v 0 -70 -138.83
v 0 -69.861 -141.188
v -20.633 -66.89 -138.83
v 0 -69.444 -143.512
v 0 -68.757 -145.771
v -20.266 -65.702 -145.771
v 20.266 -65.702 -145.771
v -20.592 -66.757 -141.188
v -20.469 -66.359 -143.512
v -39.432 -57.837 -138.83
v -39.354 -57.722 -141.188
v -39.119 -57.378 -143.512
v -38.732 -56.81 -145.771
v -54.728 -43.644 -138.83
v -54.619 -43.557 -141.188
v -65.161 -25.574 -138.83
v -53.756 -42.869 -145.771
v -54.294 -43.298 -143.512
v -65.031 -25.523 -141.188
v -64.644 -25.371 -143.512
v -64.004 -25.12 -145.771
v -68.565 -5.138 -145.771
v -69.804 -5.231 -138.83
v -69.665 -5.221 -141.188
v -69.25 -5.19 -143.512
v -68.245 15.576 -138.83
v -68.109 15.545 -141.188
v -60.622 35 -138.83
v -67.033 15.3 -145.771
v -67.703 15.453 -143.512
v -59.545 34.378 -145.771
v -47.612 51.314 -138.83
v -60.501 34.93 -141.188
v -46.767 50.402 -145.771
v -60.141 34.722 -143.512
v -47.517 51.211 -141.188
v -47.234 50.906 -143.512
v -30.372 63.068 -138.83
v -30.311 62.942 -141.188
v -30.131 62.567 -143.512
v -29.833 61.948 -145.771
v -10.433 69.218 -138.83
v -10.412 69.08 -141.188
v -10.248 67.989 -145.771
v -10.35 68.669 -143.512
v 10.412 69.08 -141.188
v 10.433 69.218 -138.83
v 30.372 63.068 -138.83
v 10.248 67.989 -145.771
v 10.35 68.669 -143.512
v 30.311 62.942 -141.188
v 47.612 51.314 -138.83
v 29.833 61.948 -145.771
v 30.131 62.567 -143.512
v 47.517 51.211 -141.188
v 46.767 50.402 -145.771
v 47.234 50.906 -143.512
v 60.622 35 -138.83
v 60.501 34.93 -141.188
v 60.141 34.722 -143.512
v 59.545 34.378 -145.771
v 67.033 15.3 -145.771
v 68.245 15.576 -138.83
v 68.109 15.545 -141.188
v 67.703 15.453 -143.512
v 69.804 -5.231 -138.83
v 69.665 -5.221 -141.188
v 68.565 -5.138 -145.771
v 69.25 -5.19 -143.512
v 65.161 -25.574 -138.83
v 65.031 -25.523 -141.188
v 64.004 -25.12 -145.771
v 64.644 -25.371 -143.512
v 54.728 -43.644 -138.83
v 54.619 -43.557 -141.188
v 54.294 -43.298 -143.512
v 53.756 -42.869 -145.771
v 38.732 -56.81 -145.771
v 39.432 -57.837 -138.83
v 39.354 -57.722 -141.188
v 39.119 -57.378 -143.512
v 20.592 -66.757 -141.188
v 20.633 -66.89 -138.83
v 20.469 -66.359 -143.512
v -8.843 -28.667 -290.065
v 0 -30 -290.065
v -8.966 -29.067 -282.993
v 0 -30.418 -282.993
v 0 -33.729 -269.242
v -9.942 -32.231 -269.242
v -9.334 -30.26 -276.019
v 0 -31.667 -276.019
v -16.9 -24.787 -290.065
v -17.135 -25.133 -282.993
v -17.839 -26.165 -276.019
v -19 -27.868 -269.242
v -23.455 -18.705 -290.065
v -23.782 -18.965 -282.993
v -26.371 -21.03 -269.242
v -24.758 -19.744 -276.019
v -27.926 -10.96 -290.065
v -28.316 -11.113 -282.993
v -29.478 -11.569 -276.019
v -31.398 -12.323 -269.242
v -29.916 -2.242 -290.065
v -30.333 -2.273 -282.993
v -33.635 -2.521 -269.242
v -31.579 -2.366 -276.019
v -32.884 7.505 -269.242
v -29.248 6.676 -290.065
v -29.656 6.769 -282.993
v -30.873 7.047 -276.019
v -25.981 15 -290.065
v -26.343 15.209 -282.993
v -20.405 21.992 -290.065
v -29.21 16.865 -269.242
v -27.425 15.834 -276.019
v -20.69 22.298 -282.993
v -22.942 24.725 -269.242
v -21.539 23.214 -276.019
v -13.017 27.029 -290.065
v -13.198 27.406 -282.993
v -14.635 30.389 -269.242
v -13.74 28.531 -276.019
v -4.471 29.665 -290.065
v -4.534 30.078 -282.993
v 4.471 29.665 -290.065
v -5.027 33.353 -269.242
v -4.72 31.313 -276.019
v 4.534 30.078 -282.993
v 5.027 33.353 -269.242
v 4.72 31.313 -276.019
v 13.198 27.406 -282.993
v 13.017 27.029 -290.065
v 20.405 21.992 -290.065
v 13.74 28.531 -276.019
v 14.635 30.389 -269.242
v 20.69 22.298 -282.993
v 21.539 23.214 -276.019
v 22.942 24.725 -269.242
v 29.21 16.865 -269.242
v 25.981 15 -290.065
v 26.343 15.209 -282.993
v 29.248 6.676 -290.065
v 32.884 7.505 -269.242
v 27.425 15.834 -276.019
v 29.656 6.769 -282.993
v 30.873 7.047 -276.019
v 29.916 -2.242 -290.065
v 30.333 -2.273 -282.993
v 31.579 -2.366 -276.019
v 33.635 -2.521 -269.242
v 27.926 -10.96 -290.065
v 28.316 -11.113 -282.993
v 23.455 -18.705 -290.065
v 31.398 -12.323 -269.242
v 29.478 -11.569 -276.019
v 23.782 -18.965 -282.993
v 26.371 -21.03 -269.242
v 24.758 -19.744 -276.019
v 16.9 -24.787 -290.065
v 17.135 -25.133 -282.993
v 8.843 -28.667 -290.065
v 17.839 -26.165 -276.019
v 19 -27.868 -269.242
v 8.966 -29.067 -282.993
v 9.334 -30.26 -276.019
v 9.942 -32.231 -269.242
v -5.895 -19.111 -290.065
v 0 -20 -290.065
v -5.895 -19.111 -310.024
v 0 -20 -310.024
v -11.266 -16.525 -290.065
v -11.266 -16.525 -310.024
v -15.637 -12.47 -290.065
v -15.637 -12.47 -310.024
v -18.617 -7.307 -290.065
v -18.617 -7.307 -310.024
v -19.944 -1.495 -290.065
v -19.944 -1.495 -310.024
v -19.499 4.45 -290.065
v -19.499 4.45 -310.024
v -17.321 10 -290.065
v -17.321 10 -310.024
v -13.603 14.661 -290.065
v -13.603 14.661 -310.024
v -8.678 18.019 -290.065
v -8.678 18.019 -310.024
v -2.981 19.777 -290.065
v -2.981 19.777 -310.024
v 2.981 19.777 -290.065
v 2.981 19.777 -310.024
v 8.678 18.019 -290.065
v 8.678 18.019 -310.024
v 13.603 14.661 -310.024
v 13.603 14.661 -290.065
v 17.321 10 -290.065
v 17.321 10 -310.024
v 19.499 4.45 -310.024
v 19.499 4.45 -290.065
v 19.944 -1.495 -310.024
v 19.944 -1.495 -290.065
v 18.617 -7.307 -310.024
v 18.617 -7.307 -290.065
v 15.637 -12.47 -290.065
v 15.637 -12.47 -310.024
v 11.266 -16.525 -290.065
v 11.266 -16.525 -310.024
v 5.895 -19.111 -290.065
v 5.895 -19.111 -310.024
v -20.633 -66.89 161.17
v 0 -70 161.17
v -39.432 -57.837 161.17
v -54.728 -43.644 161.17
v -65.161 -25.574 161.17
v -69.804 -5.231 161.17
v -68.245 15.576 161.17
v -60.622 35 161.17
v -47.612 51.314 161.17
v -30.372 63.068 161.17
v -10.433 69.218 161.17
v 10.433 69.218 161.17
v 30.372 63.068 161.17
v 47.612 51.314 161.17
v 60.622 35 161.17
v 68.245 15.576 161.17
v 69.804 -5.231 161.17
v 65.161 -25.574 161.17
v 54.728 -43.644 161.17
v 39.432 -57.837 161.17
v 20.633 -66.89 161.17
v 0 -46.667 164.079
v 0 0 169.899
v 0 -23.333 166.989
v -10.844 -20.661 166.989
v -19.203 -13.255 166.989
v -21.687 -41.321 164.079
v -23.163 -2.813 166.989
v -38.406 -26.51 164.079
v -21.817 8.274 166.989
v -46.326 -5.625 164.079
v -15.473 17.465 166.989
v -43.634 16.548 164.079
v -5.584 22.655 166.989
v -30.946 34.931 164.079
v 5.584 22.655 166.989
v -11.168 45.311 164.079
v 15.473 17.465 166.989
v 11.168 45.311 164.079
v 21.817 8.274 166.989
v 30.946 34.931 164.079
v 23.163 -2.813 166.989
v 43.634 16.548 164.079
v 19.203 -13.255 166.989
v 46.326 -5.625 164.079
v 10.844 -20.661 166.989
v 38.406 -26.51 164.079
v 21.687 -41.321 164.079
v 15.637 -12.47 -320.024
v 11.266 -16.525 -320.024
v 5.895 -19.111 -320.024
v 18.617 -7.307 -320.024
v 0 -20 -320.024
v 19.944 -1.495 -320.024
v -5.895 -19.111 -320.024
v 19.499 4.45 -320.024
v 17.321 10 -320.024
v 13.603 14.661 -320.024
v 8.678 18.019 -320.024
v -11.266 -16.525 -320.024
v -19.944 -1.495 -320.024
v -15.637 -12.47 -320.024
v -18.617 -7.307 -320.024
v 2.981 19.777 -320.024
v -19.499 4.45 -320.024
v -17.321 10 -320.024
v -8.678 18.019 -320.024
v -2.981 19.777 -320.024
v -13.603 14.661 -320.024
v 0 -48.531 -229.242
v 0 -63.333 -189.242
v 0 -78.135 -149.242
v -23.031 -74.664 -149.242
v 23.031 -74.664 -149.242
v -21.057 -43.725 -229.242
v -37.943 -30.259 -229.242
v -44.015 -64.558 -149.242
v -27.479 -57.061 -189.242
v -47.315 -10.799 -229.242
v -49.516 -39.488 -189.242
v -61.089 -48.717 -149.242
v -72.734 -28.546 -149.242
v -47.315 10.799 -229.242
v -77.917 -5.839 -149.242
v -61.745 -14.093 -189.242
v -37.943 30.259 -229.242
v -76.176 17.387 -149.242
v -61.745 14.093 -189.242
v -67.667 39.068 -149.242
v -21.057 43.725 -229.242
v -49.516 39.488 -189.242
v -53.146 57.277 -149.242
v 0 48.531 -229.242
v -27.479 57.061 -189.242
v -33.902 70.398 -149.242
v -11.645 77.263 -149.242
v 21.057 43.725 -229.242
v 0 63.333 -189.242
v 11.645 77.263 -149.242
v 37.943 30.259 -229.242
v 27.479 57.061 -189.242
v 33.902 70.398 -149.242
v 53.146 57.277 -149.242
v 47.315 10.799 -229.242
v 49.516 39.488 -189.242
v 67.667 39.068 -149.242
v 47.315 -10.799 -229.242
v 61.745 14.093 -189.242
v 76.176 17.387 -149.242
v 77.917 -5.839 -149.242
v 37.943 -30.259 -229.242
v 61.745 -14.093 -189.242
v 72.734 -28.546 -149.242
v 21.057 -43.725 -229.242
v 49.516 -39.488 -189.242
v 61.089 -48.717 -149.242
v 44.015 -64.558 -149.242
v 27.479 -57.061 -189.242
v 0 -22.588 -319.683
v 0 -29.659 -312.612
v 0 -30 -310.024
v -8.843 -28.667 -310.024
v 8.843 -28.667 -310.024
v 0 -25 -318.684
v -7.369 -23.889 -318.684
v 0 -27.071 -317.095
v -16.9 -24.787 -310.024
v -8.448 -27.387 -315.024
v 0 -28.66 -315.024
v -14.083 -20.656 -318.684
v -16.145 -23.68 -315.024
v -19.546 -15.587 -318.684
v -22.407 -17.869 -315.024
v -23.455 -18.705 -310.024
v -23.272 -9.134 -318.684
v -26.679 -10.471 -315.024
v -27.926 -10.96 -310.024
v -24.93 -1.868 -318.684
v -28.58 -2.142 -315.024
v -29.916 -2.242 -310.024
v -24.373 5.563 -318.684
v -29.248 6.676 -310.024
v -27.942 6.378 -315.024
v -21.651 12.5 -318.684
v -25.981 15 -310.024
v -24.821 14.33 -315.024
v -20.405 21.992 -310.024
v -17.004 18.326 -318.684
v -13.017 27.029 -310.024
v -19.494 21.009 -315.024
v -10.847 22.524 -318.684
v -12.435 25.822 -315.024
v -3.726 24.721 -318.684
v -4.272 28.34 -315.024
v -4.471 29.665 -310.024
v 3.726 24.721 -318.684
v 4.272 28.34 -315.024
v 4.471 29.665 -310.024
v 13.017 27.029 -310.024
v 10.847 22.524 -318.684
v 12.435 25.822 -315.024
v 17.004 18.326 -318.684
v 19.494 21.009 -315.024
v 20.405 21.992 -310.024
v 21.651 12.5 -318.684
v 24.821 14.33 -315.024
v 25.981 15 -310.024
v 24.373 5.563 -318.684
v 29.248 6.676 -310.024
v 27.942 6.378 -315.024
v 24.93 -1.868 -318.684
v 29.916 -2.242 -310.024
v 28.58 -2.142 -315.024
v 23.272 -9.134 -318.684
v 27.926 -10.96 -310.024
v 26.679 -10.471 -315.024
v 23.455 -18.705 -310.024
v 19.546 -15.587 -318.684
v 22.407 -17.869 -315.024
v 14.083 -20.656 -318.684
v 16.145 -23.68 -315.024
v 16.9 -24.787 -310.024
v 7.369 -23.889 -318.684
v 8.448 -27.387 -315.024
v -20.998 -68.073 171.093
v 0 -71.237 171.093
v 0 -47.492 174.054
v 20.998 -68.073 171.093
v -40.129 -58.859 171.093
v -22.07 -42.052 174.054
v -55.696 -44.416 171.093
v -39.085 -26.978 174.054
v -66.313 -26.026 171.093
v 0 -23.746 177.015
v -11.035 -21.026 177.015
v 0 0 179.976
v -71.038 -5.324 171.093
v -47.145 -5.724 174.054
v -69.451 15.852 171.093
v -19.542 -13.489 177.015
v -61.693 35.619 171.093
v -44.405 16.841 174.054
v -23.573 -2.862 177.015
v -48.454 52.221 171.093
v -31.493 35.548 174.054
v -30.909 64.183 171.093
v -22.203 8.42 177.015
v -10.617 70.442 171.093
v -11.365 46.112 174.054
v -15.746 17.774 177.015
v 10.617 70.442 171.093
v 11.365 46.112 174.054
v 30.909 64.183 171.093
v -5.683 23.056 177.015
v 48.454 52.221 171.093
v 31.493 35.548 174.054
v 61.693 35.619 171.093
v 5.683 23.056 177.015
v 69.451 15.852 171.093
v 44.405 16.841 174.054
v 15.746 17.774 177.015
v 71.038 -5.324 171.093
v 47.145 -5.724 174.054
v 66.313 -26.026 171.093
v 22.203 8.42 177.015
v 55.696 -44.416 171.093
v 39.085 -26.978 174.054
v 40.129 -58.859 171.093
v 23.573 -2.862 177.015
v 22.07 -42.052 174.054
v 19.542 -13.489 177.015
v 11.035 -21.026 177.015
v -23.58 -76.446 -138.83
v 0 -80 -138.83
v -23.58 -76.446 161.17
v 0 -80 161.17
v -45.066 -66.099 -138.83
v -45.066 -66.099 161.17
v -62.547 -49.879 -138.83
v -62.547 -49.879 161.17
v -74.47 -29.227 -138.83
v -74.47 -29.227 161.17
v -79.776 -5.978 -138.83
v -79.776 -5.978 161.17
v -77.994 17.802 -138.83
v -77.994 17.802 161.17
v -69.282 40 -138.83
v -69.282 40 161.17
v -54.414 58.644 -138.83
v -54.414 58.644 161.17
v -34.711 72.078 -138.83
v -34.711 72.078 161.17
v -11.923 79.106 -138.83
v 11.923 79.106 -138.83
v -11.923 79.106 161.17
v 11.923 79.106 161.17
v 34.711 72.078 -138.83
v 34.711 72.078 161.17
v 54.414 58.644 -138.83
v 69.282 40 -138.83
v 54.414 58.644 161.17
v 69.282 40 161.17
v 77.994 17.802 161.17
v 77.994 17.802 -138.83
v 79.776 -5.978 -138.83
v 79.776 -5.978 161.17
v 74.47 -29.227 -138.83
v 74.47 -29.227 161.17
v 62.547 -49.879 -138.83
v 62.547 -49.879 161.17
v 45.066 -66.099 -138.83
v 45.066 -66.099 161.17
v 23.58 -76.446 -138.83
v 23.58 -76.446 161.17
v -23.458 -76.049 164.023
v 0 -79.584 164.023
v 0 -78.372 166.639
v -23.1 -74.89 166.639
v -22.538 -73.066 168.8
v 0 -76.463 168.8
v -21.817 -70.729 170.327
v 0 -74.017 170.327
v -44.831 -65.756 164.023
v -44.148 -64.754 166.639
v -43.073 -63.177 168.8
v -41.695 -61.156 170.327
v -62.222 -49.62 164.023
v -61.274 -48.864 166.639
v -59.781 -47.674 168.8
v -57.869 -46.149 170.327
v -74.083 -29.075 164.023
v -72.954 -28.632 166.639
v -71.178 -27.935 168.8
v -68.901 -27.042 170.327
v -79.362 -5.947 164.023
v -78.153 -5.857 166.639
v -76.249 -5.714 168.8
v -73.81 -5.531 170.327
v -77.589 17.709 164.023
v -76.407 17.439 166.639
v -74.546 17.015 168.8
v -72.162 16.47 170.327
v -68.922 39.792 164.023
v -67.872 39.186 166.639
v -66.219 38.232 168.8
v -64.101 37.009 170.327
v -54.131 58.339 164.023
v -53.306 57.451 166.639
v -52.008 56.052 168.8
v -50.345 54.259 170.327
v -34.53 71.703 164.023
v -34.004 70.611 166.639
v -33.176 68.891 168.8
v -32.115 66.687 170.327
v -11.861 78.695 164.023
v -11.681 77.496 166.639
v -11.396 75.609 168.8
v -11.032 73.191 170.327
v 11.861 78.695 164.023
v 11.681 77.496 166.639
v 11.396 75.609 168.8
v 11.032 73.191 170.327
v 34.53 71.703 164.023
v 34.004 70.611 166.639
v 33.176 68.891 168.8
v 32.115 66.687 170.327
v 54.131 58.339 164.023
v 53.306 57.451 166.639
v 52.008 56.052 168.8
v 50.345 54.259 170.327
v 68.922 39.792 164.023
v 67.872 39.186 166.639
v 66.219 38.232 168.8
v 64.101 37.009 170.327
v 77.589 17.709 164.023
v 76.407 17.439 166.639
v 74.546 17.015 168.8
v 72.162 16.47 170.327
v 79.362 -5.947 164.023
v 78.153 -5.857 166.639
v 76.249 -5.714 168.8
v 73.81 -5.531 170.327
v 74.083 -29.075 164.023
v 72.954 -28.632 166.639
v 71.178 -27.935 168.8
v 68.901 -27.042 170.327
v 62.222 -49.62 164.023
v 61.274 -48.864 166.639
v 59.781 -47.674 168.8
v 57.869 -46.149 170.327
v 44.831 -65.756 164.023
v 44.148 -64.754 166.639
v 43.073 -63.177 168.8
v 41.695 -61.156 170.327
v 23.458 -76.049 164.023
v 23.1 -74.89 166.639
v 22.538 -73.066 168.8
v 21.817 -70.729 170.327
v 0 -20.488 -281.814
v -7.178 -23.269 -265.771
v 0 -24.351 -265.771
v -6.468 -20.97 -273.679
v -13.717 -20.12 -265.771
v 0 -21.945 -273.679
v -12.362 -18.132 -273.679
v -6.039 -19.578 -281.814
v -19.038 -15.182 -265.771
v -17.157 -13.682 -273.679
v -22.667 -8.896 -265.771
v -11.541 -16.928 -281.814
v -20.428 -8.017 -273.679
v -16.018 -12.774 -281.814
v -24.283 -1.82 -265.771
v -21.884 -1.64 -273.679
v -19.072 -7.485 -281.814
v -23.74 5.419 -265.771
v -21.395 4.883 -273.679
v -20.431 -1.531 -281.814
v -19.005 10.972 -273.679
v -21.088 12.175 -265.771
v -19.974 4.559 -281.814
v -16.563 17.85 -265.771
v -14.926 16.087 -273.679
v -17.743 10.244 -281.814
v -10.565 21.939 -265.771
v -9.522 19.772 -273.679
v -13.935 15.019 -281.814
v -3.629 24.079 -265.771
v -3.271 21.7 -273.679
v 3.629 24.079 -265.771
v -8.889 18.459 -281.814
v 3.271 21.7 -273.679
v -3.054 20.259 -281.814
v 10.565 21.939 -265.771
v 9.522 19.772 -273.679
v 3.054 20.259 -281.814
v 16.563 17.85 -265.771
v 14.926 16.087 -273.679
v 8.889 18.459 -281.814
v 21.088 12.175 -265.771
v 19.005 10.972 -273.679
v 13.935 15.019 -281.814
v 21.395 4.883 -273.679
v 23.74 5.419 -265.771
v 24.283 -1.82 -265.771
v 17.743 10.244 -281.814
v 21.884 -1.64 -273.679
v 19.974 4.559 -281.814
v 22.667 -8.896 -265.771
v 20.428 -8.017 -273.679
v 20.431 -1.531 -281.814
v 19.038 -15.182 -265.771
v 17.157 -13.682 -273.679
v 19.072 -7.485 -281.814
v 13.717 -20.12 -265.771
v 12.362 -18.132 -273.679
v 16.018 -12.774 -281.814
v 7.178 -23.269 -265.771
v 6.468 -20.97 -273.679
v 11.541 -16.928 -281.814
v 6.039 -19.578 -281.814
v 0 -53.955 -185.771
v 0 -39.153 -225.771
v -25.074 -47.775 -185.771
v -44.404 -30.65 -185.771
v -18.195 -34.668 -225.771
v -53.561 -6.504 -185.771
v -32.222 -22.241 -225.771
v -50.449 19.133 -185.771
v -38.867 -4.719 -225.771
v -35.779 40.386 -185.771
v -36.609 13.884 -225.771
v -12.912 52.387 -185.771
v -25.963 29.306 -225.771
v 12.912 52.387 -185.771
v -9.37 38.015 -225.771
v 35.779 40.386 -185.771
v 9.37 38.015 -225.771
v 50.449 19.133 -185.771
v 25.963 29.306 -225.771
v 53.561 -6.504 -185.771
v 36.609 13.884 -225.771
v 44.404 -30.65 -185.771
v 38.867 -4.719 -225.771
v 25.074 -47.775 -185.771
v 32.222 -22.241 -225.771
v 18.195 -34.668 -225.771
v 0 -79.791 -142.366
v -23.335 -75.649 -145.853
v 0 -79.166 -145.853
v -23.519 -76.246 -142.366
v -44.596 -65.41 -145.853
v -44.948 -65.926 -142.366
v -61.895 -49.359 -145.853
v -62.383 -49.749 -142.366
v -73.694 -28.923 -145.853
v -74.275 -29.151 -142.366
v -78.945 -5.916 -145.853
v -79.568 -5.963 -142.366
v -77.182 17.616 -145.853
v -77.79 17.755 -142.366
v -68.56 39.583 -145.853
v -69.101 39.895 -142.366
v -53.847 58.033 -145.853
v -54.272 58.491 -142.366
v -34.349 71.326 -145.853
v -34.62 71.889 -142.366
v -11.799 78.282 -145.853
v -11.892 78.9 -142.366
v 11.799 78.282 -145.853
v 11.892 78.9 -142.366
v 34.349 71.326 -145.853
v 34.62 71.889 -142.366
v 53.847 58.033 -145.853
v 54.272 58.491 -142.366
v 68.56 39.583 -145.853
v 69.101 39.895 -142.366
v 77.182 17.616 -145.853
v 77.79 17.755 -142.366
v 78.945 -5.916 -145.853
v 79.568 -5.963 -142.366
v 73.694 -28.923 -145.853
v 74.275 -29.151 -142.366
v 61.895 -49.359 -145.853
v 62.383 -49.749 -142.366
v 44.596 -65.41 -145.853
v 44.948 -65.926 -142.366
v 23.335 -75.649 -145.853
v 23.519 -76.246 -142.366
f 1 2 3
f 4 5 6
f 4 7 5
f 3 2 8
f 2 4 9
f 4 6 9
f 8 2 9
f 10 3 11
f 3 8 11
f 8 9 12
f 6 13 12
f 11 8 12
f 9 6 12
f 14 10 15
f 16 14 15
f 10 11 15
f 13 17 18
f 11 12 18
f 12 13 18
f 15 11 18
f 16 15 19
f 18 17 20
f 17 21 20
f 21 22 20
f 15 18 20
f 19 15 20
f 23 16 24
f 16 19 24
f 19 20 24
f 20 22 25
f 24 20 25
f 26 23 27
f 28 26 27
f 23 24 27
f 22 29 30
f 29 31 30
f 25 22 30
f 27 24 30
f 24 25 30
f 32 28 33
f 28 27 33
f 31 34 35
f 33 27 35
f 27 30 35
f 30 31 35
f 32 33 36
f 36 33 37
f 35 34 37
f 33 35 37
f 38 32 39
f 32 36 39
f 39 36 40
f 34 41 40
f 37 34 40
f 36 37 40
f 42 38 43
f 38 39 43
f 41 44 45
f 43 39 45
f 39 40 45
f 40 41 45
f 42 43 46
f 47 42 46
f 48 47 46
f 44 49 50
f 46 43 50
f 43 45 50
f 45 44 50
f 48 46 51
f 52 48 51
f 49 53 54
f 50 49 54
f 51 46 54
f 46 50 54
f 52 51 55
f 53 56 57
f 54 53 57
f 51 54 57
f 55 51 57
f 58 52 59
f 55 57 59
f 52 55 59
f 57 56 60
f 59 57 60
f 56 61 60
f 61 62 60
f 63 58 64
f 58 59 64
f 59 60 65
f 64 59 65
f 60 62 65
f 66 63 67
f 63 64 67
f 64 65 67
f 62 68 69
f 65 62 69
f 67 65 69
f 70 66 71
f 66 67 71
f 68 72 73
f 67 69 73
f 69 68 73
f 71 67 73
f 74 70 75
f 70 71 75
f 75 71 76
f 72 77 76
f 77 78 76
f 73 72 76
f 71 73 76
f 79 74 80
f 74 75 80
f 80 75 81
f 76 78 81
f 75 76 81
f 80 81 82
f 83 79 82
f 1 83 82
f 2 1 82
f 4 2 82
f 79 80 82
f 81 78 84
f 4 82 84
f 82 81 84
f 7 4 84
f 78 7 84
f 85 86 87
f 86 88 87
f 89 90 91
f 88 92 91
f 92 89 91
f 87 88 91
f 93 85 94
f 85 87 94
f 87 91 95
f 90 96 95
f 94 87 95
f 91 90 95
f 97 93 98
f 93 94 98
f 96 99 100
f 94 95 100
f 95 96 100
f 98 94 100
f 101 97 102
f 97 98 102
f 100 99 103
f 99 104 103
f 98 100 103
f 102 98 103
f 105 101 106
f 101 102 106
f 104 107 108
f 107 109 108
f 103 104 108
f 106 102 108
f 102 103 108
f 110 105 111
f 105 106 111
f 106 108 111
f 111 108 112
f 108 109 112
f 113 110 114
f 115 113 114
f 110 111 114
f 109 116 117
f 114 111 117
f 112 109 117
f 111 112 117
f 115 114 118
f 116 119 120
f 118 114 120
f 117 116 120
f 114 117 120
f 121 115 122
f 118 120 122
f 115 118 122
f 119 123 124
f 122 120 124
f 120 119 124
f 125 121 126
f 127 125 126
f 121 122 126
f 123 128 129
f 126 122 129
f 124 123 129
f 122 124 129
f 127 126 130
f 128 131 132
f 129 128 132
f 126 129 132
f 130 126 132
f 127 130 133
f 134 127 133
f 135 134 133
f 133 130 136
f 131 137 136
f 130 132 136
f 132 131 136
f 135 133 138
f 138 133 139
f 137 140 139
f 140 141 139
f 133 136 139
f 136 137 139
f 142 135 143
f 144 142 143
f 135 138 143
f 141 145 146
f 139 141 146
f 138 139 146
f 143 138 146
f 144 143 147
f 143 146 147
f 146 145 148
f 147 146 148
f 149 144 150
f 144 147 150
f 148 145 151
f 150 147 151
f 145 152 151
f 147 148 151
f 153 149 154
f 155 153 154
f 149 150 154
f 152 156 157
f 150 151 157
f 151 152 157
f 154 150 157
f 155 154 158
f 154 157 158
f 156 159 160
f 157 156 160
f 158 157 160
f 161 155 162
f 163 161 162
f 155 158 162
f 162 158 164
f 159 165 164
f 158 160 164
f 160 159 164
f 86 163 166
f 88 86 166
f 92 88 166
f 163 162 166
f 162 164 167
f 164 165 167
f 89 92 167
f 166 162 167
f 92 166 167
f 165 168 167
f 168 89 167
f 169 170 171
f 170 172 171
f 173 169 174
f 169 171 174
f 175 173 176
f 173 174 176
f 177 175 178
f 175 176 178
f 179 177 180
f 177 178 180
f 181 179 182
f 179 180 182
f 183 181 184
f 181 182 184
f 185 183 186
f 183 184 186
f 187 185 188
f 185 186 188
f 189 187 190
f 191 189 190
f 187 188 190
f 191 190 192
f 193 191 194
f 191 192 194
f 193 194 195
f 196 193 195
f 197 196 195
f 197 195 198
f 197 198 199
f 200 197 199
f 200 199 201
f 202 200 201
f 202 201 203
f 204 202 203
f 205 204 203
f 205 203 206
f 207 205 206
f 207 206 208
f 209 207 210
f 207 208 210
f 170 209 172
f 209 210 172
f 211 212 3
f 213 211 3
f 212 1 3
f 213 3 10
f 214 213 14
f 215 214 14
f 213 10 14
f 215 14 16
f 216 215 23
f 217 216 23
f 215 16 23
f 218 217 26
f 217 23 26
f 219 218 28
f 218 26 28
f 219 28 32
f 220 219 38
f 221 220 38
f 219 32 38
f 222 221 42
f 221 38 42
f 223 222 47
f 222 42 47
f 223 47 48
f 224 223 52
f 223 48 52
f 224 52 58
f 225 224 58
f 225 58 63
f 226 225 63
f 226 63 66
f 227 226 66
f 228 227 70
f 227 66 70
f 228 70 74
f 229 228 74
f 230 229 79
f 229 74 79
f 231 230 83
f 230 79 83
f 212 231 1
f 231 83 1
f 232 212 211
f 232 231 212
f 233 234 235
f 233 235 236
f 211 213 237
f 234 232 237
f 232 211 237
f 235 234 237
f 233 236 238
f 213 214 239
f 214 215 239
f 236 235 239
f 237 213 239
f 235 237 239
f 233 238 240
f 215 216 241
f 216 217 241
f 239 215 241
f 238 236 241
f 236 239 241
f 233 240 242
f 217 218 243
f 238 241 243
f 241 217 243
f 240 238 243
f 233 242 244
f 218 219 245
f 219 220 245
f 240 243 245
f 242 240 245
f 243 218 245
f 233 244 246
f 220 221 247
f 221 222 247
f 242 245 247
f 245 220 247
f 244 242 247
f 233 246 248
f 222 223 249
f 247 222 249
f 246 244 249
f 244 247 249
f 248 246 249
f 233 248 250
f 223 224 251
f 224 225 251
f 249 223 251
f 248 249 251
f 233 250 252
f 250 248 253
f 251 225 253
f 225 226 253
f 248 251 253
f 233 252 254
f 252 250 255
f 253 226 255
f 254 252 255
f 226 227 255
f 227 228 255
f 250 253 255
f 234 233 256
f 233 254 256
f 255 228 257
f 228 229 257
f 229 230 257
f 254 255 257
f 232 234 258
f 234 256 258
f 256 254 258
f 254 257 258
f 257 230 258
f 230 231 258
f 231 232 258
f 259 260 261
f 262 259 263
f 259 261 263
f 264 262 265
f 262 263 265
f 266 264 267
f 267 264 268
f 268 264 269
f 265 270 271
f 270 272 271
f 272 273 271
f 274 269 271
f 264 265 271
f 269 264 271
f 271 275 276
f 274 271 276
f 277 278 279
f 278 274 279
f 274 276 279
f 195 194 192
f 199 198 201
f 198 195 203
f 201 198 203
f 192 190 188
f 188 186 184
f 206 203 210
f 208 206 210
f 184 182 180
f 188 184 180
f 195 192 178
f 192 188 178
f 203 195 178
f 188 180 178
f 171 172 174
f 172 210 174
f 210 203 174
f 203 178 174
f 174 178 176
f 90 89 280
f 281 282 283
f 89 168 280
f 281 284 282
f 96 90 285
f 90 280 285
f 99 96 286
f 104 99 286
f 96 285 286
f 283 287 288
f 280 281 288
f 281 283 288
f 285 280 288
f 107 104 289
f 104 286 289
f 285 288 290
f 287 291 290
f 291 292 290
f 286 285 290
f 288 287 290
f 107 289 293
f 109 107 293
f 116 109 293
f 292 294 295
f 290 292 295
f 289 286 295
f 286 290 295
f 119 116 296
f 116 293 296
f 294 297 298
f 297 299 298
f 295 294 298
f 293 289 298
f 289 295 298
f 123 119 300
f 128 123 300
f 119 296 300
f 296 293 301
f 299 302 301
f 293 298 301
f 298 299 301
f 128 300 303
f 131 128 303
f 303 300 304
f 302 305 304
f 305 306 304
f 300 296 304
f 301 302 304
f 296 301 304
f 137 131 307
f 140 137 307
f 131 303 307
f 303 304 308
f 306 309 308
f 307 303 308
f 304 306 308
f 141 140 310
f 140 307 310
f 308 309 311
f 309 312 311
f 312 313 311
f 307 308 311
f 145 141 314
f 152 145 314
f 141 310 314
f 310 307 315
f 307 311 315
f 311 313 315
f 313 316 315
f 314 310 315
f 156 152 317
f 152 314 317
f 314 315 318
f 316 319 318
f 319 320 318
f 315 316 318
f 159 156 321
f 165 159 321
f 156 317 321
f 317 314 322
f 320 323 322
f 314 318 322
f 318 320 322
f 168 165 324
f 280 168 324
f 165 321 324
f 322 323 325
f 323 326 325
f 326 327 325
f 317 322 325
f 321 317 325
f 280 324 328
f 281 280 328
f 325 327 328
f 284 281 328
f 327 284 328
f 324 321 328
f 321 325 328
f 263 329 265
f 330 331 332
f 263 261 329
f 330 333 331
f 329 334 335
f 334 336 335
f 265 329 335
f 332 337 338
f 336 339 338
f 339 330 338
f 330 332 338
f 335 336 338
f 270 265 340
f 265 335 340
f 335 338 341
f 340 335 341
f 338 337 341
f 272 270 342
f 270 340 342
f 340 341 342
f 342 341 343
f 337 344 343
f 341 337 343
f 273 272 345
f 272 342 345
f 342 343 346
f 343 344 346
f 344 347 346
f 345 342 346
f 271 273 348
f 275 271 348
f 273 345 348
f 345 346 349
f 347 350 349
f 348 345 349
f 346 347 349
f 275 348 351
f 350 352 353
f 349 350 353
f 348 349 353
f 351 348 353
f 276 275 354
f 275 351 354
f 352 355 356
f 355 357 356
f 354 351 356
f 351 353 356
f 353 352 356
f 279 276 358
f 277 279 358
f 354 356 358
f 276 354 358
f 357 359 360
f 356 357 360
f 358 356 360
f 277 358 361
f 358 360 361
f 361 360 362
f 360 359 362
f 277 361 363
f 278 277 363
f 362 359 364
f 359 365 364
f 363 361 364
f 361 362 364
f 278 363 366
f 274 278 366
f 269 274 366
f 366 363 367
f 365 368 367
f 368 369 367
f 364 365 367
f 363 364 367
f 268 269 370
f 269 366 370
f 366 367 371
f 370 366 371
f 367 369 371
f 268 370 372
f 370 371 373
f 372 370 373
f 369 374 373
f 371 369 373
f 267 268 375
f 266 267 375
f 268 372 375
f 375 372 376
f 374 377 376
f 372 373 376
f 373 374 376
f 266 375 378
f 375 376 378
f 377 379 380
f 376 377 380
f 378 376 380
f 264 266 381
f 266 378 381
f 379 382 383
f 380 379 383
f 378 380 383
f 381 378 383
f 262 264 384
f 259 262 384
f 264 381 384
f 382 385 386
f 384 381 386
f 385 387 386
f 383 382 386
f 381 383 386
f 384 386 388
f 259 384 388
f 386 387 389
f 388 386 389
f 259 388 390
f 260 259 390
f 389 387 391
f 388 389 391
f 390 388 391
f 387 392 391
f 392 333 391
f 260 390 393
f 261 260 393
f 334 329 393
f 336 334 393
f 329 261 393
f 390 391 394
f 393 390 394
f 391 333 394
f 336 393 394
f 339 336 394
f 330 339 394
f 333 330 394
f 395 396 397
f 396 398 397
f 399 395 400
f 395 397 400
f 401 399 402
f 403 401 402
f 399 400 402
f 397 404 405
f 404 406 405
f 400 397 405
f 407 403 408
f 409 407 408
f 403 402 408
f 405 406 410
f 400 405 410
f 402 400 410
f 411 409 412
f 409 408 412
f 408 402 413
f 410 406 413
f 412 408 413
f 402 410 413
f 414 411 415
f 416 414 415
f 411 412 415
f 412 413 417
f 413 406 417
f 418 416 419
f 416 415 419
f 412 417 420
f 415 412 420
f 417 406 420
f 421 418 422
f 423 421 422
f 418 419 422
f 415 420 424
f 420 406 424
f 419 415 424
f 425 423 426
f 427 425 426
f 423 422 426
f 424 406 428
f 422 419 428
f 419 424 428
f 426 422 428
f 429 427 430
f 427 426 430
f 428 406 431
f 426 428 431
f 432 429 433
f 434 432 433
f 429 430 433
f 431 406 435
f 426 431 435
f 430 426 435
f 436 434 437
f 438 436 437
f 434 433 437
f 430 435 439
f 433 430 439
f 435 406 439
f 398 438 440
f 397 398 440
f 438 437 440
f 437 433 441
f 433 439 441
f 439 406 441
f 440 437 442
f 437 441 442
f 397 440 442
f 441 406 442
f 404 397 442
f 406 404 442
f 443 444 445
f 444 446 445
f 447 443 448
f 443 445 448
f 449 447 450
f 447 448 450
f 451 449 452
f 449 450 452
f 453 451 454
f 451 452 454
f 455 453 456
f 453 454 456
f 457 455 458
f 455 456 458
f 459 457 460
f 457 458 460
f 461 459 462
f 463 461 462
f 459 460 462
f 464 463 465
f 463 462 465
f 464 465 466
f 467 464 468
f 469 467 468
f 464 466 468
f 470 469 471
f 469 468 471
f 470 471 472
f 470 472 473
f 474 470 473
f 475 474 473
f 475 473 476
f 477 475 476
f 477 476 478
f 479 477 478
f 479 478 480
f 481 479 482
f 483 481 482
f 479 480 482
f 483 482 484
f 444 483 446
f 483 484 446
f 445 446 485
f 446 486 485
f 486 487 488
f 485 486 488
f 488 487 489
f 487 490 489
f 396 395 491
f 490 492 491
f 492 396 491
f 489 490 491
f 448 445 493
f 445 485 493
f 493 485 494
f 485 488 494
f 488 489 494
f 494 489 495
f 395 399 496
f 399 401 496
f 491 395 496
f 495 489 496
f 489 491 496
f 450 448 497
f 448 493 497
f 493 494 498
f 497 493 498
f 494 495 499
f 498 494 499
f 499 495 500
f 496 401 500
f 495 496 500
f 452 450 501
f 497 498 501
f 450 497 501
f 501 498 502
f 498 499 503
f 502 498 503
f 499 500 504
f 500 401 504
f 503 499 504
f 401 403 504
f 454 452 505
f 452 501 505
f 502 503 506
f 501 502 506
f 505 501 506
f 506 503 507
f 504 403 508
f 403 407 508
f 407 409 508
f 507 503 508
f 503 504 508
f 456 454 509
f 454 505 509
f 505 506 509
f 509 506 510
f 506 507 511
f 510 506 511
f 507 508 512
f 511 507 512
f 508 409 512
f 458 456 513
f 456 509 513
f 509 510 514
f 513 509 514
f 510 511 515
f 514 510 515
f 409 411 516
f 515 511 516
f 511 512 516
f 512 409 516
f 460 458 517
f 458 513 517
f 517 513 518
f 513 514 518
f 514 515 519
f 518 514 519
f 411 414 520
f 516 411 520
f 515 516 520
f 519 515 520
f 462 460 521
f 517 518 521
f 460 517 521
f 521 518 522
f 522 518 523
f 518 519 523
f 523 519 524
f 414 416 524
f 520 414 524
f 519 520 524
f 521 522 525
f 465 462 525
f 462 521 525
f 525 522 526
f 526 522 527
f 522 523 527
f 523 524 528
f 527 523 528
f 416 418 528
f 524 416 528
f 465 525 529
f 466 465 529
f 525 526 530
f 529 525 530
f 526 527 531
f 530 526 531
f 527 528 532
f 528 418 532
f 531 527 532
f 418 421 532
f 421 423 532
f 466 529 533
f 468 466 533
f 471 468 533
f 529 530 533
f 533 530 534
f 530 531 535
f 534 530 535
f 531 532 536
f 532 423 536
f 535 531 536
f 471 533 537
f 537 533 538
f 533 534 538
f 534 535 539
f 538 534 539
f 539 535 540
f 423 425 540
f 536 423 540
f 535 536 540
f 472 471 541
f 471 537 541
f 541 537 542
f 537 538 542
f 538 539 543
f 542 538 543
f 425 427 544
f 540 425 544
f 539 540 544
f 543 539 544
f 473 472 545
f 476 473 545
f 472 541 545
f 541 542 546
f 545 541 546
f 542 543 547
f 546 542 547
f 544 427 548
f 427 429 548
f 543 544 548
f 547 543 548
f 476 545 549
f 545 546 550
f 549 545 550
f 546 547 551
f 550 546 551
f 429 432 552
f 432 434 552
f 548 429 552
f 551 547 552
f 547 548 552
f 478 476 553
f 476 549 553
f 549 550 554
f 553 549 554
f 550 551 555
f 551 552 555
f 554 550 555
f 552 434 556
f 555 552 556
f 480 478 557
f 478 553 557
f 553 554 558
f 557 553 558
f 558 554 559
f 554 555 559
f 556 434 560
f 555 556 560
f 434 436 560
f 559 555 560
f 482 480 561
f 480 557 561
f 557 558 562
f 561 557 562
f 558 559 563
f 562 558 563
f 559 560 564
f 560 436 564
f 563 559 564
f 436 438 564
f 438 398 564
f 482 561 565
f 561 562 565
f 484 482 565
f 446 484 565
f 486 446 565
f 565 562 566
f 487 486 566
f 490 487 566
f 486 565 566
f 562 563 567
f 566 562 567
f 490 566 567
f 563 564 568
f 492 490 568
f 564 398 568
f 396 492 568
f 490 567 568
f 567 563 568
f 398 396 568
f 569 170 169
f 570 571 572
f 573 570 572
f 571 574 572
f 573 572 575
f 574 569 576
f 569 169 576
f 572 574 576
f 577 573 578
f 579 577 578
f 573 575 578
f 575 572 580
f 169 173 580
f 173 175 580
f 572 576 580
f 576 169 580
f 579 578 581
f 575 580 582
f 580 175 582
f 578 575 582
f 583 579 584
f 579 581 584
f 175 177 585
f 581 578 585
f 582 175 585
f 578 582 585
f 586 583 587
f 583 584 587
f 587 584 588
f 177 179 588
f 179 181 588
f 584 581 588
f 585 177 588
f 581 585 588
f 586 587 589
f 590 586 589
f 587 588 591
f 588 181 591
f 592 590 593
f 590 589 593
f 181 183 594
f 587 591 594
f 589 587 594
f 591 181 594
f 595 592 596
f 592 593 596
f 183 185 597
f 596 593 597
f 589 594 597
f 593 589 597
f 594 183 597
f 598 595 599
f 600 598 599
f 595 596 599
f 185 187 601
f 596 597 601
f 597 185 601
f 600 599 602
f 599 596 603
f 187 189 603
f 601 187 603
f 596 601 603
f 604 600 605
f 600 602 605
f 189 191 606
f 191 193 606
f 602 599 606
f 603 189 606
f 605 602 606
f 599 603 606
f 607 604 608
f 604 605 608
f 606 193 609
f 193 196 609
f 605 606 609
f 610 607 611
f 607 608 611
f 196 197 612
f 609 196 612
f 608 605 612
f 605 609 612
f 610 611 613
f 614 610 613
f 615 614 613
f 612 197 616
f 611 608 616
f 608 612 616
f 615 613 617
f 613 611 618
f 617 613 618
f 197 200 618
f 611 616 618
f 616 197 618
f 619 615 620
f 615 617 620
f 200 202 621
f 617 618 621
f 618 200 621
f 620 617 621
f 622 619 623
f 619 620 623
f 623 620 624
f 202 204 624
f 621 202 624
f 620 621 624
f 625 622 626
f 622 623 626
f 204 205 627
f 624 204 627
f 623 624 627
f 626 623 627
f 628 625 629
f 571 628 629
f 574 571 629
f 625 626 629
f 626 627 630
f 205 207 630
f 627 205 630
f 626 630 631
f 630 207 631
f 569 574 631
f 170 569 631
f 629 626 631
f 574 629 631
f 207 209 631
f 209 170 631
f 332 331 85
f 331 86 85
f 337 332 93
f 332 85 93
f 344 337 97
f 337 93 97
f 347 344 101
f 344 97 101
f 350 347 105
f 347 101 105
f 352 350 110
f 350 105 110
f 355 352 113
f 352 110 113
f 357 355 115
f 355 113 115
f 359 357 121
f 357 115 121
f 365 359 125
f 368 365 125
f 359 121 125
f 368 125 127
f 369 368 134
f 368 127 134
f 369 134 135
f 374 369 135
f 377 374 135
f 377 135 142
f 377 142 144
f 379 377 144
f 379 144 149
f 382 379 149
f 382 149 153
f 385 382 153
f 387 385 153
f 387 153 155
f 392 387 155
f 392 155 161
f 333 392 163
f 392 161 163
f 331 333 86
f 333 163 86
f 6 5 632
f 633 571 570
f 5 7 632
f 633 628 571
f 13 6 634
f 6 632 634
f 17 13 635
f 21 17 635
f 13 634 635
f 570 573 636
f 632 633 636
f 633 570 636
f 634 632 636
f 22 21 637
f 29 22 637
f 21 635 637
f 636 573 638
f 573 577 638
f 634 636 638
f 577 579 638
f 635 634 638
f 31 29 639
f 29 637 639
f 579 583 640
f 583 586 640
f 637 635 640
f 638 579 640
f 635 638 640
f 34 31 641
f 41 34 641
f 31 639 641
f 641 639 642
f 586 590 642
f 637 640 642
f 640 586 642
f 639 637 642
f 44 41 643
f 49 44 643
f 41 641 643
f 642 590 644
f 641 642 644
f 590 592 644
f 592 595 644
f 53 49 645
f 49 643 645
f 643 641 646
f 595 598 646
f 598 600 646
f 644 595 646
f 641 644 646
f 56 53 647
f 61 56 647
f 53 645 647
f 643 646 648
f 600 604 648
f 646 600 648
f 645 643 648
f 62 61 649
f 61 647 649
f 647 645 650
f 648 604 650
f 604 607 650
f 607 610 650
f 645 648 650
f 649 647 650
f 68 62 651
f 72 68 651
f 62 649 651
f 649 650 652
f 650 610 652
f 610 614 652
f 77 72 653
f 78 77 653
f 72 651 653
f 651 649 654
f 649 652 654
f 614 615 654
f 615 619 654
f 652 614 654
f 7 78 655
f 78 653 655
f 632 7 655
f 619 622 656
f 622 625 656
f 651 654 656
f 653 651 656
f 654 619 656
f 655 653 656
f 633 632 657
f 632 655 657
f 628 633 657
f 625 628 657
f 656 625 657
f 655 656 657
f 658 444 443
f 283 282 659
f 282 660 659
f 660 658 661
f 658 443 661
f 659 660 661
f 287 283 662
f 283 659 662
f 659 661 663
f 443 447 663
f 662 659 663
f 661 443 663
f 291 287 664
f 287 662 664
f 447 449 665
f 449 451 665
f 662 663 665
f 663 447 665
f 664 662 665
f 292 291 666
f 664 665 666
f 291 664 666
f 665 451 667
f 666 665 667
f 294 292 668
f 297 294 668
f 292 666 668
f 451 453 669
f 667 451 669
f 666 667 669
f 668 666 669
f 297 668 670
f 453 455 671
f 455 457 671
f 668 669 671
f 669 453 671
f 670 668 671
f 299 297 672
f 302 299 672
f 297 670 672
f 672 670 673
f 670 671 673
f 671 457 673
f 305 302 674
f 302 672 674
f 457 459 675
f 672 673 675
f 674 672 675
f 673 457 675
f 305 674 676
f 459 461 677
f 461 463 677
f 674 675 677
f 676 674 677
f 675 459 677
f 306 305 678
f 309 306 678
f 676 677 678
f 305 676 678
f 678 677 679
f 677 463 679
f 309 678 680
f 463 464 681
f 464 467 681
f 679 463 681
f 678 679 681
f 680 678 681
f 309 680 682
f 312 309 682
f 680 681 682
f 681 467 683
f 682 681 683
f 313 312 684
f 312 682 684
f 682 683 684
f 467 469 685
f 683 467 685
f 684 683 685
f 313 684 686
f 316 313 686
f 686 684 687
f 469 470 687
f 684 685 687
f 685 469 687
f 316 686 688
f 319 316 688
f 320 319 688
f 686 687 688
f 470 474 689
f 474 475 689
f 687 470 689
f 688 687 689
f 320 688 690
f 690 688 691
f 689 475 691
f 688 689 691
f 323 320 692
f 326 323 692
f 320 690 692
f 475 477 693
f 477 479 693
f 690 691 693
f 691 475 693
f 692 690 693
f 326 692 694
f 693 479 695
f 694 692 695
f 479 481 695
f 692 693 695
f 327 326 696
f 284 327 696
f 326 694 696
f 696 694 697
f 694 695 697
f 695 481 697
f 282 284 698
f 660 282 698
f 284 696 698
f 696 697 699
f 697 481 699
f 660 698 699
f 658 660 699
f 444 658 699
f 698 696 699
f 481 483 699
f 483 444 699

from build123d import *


with BuildPart() as part:
    # Sketch1 → Revolve2 (revolve)
    with BuildSketch(Plane(origin=(0, 0, 0), x_dir=(0, 0, -1), z_dir=(1, 0, 0)), mode=Mode.PRIVATE) as revolve2_sk:
        with BuildLine():
            Line((310.023918284, 20), (310.023918284, 0))
            Line((310.023918284, 0), (320.023918284, 0))
            Line((320.023918284, 0), (320.023918284, 20))
            ThreePointArc((320.023918284, 20), (317.094986096, 27.071067812), (310.023918284, 30))
            Line((310.023918284, 30), (290.064881334, 30))
            ThreePointArc((290.064881334, 30), (279.487694994, 30.939665349), (269.24180917, 33.729229029))
            Line((269.24180917, 33.729229029), (149.24180917, 78.135385485))
            ThreePointArc((149.24180917, 78.135385485), (144.118866258, 79.530167326), (138.830273088, 80))
            Line((138.830273088, 80), (-161.169726912, 80))
            ThreePointArc((-161.169726912, 80), (-167.788864689, 77.49579983), (-171.092873277, 71.237403019))
            Line((-171.092873277, 71.237403019), (-179.976081716, 0))
            Line((-179.976081716, 0), (-169.898632858, 0))
            Line((-169.898632858, 0), (-161.169726912, 70))
            Line((-161.169726912, 70), (138.830273088, 70))
            ThreePointArc((138.830273088, 70), (142.356001868, 69.686778217), (145.771297142, 68.756923657))
            Line((145.771297142, 68.756923657), (265.771297142, 24.350767201))
            ThreePointArc((265.771297142, 24.350767201), (277.724830603, 21.09627624), (290.064881334, 20))
            Line((290.064881334, 20), (310.023918284, 20))
        make_face()
    revolve(revolve2_sk.sketch.rotate(Axis((0, 0, 179.976081716), (0, 0, -1)), 180), axis=Axis((0, 0, 179.976081716), (0, 0, -1)))


solid = part.part
